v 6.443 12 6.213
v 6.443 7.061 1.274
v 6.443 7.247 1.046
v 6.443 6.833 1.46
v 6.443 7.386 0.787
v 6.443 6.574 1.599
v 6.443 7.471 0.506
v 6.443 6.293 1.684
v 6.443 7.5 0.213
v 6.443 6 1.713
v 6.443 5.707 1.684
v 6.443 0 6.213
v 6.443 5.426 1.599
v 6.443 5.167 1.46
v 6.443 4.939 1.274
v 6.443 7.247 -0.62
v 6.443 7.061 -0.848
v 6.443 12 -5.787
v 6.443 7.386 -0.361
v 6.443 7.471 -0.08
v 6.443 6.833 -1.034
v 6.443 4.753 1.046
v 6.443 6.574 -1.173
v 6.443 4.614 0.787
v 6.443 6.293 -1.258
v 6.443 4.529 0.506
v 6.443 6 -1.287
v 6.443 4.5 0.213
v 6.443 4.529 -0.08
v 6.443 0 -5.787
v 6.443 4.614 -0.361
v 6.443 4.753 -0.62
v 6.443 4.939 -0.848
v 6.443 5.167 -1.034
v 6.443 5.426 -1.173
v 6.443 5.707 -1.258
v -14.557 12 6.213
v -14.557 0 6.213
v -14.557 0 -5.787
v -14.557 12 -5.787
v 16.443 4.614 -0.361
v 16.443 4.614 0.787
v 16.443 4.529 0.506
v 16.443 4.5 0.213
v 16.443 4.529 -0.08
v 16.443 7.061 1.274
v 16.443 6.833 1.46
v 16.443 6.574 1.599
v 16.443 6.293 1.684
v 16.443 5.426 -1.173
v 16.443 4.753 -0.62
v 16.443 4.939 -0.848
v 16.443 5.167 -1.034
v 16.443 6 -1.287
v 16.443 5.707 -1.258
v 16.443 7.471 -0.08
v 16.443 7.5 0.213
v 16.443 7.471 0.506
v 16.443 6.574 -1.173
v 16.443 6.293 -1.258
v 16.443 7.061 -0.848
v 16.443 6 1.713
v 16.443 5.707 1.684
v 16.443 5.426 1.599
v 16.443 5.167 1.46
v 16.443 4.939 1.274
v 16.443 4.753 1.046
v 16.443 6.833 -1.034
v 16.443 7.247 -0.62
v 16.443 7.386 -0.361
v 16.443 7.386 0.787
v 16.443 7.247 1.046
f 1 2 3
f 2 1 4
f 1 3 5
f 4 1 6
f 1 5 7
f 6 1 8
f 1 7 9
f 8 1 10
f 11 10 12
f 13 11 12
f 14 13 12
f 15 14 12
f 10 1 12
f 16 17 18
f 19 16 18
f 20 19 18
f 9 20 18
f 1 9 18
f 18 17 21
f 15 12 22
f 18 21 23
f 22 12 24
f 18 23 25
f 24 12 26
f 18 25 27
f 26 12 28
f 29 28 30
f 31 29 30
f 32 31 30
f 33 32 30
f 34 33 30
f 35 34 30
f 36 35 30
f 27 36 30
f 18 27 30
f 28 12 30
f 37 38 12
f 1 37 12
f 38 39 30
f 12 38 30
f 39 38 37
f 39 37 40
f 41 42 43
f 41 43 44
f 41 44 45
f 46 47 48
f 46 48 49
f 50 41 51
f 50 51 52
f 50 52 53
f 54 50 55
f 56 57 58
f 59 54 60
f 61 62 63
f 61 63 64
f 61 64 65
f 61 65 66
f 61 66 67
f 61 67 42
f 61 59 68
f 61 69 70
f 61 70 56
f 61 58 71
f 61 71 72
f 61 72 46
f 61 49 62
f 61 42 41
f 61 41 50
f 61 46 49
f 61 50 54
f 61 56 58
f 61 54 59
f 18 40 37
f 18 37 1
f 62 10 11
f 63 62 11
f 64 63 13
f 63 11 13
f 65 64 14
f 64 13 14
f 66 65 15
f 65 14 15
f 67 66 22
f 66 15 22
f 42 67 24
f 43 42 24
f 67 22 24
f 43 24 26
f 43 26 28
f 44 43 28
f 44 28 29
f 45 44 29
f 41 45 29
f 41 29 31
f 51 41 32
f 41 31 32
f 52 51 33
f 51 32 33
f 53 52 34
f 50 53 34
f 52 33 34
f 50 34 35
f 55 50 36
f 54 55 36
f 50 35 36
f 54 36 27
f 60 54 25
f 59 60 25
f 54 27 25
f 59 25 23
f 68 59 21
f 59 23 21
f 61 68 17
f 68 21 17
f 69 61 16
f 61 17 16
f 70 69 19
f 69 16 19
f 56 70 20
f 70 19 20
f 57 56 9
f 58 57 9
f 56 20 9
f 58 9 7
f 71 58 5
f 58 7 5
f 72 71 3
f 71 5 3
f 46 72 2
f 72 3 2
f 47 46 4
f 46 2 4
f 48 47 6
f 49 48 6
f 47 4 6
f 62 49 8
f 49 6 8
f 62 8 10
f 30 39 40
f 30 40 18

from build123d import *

# Parameters (mm, degrees)
SKETCH1_W           = 21
SKETCH1_H           = 12
BOSS_EXTRUDE1_DEPTH = 12
BOSS_EXTRUDE2_DEPTH = 10


with BuildPart() as part:
    # Sketch1 → Boss-Extrude1 (new body)
    with BuildSketch(Plane(origin=(0, 0, 0), x_dir=(1, 0, 0), z_dir=(0, 1, 0))):
        with Locations((-4.056818182, -0.213068182)):
            Rectangle(SKETCH1_W, SKETCH1_H)
    extrude(amount=BOSS_EXTRUDE1_DEPTH)

    # Sketch2 → Boss-Extrude2 (add)
    with BuildSketch(Plane(origin=(6.443181818, 0, 0), x_dir=(0, 0, -1), z_dir=(1, 0, 0))):
        with BuildLine():
            ThreePointArc((1.286931818, 6), (-0.213068182, 7.5), (-1.713068182, 6))
            Line((-1.713068182, 6), (1.286931818, 6))
        make_face()
        with BuildLine():
            Line((1.286931818, 6), (-1.713068182, 6))
            ThreePointArc((-1.713068182, 6), (-0.213068182, 4.5), (1.286931818, 6))
        make_face()
    extrude(amount=BOSS_EXTRUDE2_DEPTH)


solid = part.part
